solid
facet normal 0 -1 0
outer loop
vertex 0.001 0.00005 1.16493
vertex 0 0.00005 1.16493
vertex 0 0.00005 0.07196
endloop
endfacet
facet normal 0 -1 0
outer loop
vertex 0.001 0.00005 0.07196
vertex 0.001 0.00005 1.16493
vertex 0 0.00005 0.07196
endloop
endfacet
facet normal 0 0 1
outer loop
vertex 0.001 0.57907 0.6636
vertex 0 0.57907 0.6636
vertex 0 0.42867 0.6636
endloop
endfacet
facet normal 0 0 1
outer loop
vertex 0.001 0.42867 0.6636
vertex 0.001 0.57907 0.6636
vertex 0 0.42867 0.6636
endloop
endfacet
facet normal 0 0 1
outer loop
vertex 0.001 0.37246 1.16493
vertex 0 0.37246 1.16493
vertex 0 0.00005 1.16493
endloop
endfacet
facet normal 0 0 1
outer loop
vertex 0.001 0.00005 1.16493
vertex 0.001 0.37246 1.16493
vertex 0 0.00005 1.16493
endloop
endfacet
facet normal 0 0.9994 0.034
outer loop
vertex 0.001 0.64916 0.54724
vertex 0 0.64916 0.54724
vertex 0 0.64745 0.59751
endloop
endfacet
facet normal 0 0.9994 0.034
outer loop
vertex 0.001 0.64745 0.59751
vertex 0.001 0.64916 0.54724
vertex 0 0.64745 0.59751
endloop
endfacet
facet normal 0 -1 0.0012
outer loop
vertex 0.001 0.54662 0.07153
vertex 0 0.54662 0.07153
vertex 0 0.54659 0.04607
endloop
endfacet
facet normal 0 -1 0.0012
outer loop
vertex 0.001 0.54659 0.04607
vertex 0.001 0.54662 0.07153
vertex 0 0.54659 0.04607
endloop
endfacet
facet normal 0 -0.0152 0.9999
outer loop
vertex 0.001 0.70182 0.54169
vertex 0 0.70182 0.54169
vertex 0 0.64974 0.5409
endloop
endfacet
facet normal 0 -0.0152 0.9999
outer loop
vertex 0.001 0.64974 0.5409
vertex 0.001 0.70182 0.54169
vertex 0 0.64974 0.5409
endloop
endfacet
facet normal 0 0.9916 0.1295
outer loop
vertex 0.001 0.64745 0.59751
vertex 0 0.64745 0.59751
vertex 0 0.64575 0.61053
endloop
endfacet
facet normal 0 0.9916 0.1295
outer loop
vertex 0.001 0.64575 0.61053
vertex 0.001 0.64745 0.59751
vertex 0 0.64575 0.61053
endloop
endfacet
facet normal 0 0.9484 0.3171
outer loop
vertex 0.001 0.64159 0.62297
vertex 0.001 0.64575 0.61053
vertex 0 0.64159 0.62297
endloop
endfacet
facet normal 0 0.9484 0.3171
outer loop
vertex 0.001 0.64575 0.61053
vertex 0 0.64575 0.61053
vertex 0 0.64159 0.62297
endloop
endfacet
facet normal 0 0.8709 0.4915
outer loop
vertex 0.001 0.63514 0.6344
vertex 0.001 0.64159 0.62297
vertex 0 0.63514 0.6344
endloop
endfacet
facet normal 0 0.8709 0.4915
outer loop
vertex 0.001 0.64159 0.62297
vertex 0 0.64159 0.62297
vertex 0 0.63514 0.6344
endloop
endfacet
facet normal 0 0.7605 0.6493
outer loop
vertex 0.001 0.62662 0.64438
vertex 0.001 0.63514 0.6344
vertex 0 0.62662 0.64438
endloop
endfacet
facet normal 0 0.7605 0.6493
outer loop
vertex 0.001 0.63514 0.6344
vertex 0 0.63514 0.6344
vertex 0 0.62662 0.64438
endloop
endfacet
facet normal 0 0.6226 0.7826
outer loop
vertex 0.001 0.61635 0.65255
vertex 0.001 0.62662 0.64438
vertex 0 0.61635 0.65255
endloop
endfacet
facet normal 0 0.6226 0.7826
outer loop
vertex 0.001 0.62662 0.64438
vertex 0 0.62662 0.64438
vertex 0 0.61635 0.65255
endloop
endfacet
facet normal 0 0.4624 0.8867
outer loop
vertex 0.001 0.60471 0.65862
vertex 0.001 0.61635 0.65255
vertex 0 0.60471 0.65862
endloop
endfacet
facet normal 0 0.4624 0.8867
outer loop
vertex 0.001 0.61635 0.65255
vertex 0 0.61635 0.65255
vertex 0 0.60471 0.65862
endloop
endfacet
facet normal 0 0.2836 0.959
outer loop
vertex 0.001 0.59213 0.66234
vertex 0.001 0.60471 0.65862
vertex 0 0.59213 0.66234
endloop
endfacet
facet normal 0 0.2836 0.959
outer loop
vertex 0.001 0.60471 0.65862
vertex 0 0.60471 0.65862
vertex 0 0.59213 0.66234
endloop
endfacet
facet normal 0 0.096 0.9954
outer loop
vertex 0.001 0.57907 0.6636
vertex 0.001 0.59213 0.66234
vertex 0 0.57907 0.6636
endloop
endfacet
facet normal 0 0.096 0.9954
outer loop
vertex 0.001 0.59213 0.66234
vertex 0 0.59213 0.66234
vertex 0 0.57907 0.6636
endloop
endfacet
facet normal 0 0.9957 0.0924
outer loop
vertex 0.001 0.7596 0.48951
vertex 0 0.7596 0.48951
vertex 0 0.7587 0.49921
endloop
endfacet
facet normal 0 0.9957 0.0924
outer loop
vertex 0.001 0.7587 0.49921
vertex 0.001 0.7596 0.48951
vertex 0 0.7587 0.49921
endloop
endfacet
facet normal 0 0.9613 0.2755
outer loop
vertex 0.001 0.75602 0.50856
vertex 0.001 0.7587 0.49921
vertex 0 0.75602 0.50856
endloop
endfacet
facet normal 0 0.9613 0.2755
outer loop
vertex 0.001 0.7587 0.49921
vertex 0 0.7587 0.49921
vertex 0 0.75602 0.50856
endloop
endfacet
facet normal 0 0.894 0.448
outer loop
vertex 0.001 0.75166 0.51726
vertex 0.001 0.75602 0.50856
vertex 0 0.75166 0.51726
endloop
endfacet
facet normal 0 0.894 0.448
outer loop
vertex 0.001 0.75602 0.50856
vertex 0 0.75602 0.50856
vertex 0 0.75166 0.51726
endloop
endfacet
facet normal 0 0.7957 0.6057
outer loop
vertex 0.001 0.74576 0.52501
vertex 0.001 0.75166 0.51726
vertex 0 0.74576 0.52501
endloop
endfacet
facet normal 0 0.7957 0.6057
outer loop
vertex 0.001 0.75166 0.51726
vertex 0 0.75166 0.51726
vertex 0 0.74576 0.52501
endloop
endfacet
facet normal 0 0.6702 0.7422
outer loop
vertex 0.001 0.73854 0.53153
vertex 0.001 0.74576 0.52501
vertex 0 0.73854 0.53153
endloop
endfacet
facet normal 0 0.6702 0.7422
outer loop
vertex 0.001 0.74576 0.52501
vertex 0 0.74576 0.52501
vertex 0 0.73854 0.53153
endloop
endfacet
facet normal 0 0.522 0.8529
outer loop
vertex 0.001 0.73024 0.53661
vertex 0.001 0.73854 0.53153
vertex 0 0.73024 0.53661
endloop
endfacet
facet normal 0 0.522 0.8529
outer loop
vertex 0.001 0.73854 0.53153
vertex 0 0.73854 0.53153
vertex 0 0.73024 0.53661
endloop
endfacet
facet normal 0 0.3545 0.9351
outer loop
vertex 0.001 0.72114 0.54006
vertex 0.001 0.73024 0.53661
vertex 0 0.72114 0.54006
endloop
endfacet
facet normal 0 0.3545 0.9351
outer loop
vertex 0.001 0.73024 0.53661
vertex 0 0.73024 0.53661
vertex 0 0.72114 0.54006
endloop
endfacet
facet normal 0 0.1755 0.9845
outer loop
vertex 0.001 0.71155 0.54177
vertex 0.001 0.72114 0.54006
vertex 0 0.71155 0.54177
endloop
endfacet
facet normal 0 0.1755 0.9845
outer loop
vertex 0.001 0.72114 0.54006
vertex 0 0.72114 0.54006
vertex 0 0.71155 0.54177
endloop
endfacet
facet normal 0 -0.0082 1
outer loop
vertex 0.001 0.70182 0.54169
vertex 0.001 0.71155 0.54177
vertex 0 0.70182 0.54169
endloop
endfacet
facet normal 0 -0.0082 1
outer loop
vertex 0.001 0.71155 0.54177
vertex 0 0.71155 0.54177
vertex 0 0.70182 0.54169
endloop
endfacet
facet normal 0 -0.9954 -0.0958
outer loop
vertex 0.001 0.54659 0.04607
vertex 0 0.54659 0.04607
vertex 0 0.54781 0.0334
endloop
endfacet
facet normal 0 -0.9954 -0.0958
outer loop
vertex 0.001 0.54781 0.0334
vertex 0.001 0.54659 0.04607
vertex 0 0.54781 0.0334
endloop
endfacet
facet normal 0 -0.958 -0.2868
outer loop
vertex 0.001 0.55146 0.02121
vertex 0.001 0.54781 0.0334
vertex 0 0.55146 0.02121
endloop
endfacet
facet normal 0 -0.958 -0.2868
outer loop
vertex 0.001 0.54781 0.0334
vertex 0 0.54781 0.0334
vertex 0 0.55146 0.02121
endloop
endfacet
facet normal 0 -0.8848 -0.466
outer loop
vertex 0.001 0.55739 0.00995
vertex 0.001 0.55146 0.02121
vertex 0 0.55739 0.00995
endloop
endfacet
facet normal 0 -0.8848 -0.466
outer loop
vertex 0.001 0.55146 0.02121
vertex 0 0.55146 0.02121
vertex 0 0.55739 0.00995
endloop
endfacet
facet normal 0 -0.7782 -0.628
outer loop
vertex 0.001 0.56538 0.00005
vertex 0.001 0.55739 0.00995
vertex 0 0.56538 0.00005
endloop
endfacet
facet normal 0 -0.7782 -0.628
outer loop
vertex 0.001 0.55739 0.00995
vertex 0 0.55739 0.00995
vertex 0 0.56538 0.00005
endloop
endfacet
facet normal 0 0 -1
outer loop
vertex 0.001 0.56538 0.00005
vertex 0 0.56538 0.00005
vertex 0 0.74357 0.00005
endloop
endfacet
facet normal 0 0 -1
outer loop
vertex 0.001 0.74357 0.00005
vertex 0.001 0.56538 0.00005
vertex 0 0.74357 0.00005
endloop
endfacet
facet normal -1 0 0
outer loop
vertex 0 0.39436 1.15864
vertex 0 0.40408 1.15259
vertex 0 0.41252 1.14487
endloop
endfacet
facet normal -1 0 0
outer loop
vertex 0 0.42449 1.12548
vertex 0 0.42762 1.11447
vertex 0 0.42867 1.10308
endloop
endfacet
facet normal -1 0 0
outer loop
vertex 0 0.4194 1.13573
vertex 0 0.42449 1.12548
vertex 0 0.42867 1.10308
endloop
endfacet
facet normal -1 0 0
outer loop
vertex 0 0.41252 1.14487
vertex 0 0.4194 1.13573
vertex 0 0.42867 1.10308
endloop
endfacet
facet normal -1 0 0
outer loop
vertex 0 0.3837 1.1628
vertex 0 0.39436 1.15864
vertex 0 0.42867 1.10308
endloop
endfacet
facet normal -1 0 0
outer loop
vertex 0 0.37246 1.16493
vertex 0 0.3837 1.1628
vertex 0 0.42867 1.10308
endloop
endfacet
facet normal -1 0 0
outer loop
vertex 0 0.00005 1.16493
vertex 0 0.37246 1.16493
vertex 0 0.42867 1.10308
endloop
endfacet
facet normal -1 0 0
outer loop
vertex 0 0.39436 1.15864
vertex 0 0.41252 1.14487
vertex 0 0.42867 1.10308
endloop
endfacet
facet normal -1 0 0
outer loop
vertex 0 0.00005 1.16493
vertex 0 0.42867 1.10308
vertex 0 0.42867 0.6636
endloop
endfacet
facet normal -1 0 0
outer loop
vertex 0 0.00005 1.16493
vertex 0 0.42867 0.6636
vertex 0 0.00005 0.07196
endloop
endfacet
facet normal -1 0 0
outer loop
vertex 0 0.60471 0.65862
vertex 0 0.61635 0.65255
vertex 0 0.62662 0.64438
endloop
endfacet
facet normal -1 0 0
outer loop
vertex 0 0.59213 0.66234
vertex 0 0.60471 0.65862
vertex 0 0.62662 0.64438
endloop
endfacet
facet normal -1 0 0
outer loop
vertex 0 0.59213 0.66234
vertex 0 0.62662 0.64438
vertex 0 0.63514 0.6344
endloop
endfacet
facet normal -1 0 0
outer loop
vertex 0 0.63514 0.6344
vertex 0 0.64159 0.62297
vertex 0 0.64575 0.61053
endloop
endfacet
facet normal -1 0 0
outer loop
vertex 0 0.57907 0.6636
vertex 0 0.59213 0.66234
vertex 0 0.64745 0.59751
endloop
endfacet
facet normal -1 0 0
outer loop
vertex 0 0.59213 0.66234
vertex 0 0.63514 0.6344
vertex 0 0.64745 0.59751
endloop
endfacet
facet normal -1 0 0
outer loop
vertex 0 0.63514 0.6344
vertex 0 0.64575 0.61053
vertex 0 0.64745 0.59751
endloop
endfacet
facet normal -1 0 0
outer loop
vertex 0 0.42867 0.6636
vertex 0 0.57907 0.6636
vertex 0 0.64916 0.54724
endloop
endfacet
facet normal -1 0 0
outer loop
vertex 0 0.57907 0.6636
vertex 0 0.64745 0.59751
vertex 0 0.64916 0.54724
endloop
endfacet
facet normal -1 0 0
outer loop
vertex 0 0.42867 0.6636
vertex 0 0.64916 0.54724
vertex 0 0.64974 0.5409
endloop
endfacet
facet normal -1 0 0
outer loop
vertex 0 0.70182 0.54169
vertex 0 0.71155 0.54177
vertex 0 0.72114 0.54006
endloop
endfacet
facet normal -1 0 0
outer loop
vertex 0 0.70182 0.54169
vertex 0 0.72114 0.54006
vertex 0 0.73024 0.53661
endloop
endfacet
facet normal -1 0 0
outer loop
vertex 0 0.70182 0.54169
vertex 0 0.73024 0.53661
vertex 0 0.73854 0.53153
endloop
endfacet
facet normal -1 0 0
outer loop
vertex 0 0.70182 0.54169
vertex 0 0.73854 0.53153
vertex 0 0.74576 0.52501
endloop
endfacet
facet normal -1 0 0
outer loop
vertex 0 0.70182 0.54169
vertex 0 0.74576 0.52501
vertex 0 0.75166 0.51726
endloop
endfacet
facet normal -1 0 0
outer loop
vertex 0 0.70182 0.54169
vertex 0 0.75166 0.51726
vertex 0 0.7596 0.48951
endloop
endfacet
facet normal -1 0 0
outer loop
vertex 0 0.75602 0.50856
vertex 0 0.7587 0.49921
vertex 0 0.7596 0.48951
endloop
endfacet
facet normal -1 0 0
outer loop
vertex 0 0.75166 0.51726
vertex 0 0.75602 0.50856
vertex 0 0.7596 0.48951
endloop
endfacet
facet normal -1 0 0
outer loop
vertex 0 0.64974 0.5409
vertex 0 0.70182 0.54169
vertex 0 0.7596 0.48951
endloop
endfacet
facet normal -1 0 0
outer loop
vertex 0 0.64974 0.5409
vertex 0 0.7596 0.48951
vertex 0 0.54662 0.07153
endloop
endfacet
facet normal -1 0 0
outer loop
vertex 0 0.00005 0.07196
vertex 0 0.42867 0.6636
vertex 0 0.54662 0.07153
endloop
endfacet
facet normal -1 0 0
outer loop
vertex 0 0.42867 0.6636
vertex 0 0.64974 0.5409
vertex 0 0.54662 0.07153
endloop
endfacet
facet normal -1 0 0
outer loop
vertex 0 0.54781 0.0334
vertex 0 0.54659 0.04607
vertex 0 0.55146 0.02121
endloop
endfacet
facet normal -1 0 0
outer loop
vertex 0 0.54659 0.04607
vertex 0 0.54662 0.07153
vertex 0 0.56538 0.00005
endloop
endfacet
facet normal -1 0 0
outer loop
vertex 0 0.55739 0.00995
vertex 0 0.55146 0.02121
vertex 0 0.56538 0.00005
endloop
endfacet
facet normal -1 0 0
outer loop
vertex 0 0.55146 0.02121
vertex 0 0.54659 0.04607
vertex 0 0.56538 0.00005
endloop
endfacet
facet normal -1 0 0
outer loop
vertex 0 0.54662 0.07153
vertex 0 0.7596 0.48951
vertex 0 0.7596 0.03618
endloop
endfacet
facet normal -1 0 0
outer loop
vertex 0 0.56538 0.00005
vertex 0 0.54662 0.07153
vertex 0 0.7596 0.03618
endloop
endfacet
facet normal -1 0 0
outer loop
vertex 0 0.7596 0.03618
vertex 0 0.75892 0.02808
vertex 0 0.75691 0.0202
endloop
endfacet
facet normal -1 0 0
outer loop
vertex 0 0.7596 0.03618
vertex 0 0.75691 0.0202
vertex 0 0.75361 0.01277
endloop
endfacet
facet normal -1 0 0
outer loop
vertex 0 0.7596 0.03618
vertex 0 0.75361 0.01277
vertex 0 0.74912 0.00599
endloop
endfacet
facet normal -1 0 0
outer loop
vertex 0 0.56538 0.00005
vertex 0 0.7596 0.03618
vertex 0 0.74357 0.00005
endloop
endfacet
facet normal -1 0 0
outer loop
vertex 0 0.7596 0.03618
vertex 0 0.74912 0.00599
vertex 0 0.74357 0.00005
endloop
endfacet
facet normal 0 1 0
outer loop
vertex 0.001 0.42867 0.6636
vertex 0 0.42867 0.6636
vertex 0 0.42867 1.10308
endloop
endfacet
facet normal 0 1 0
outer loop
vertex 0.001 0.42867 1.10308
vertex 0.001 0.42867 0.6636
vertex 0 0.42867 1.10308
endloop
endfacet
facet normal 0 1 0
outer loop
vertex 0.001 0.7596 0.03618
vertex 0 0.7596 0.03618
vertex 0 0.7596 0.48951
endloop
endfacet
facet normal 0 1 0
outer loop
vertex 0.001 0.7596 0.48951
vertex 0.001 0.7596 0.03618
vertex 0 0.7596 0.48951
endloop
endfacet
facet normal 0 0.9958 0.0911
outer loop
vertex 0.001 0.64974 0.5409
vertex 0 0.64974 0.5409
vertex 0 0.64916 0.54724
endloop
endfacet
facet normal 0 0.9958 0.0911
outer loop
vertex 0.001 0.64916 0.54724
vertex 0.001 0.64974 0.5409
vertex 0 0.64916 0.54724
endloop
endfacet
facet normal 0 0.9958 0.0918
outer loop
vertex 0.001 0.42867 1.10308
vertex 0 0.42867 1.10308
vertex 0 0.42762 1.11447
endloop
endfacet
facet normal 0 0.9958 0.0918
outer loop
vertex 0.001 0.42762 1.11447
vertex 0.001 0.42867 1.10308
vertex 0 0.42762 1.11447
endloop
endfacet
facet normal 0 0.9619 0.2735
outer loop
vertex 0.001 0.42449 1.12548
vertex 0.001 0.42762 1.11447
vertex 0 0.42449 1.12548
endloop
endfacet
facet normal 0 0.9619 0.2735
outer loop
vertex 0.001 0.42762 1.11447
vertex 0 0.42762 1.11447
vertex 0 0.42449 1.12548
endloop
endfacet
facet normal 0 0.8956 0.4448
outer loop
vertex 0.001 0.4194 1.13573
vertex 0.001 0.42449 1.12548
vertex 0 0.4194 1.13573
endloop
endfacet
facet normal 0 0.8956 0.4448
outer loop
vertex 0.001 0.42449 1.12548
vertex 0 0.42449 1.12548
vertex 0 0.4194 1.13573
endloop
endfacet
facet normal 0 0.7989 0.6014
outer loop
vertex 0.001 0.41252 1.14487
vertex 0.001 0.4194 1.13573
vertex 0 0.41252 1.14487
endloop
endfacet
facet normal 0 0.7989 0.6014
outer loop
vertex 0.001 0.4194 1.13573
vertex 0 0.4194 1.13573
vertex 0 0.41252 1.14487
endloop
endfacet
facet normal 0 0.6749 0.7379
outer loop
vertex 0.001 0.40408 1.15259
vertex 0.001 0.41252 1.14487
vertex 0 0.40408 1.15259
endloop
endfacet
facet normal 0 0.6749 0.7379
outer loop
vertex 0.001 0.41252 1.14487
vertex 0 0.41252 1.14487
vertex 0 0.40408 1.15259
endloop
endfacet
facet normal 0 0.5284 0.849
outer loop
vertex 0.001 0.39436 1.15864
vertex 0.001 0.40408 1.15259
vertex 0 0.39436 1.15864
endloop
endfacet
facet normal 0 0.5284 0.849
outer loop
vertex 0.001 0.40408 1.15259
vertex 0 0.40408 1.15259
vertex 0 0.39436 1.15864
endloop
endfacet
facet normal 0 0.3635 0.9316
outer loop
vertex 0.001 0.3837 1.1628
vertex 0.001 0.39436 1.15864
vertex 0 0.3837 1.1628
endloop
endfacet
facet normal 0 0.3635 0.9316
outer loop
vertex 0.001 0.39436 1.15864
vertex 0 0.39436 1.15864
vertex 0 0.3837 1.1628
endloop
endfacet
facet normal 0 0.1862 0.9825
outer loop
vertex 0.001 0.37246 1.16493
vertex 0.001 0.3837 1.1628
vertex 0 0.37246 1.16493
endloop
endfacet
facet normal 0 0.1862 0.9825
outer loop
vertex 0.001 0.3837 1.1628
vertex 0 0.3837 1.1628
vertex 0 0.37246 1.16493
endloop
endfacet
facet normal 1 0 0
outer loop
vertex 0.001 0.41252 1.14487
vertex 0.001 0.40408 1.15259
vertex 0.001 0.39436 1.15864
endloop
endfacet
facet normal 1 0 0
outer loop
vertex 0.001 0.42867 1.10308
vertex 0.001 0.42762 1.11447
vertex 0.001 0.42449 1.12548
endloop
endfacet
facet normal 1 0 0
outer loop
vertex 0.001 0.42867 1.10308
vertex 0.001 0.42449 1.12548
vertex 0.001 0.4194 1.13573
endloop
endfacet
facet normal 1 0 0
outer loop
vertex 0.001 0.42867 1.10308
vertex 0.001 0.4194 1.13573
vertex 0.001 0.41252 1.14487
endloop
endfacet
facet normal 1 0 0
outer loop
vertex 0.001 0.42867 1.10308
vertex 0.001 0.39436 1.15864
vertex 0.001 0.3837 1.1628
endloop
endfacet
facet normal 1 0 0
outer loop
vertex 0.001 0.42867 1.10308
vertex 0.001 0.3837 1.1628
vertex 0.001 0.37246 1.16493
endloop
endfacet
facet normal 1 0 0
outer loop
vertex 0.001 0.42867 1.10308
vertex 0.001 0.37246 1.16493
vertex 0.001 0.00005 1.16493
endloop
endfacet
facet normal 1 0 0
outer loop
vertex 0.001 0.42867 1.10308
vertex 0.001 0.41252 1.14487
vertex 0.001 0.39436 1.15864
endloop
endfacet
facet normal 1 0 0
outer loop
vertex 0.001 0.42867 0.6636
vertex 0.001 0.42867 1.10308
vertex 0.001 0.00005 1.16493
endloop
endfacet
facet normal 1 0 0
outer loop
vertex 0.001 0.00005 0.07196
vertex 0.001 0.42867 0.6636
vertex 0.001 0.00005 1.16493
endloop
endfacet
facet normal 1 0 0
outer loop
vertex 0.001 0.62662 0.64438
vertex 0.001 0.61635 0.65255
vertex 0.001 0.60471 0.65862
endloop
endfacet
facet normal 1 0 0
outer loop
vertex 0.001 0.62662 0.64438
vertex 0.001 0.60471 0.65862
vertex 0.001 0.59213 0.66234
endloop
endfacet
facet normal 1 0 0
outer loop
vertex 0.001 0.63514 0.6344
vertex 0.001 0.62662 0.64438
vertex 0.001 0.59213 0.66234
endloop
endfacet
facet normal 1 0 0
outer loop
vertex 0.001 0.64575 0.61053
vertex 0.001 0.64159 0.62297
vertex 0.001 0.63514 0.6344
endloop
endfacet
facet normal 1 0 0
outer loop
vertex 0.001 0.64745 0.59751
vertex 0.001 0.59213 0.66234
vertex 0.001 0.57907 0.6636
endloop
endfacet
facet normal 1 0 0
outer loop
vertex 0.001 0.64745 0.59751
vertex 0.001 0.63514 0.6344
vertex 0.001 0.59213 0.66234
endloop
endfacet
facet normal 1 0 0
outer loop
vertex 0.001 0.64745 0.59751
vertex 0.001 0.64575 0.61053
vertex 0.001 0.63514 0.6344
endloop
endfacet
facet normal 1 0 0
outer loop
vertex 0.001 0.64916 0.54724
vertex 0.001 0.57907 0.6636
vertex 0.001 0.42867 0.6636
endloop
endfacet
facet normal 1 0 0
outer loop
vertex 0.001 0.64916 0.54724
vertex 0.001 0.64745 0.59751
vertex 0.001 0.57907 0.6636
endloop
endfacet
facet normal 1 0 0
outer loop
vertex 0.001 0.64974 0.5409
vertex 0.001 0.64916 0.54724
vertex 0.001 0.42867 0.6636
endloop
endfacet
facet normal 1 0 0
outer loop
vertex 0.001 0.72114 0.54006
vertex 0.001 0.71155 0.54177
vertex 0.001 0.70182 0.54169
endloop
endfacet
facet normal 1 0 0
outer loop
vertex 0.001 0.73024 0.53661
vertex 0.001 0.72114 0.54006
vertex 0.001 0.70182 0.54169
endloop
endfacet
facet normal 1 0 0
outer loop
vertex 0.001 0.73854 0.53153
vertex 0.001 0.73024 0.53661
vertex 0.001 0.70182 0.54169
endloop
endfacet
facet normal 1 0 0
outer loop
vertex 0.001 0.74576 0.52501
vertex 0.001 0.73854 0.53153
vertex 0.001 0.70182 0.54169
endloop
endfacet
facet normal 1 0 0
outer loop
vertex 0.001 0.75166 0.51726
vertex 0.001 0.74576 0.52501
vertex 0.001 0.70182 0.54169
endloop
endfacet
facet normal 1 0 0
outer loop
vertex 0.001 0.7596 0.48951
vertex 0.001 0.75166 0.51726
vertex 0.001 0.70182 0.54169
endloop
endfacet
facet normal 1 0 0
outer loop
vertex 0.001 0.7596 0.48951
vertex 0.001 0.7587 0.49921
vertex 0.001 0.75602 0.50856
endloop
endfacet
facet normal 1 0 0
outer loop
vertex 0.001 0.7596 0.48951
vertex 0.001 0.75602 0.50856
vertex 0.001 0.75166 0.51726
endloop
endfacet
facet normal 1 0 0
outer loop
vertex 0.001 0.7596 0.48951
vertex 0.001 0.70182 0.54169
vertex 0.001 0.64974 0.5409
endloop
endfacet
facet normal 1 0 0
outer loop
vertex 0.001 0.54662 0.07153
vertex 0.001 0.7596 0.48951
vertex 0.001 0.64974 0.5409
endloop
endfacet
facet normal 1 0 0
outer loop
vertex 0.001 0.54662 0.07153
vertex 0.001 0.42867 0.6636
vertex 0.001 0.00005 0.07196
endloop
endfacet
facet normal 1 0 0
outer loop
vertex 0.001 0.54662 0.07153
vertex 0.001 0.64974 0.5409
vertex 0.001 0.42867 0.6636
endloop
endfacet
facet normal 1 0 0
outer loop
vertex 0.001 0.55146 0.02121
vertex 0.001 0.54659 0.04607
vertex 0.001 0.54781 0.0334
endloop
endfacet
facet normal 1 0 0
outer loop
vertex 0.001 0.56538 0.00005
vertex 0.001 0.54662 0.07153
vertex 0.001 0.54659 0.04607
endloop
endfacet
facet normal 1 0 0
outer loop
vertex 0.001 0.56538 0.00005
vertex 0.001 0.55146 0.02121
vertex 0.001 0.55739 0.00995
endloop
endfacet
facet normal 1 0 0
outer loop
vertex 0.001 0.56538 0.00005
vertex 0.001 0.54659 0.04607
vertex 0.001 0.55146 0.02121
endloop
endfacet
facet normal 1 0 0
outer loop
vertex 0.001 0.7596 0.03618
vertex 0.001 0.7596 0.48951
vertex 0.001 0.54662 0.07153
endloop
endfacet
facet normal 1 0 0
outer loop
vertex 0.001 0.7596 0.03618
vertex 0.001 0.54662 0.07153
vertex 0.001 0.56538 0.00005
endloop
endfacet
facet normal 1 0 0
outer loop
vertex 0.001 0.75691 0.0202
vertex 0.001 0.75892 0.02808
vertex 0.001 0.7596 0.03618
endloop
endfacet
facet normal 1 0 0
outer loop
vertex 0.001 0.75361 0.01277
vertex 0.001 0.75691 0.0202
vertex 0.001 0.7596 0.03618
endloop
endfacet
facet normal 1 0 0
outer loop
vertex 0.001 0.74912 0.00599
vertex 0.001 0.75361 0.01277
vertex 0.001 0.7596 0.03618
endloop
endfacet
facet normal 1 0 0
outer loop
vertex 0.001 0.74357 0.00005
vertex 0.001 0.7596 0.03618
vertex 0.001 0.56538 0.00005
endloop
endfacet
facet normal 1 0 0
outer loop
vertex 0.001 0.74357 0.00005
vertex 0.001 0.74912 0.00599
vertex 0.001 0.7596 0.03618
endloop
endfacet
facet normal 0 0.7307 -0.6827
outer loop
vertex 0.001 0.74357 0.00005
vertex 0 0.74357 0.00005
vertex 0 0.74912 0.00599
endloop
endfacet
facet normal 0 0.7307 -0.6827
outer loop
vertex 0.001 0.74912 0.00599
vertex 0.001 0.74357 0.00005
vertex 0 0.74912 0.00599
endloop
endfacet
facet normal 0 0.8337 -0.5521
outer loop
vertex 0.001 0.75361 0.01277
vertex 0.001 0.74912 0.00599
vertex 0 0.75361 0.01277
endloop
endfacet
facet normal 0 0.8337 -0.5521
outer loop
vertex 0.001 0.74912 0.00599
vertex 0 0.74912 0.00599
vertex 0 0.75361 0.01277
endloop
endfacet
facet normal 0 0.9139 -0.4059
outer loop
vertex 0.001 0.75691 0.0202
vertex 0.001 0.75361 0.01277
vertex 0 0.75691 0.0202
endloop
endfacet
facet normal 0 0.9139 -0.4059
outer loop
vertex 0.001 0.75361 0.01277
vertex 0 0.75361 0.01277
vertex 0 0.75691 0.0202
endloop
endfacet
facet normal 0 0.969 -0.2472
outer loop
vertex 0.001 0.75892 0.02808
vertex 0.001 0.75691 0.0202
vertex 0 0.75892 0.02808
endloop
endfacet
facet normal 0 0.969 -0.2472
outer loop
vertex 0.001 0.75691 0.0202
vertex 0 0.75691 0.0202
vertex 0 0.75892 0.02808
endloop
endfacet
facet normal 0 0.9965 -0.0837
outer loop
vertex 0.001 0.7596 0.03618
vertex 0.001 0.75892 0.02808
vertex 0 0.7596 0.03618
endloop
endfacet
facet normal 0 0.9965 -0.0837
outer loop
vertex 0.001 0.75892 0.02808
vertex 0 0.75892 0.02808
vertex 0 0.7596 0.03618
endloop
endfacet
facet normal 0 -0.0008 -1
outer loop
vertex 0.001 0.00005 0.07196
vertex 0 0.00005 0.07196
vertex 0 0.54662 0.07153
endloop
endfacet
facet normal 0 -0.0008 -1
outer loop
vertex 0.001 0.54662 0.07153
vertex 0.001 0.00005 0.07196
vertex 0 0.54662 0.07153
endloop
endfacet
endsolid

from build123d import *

# Parameters (mm, degrees)
ESTRUSIONE_ESTRUSIONE1_DEPTH = 0.001


with BuildPart() as part:
    # Schizzo1 → Estrusione-Estrusione1 (new body)
    with BuildSketch(Plane(origin=(0, 0, 0), x_dir=(0, 0, -1), z_dir=(1, 0, 0))):
        with BuildLine():
            Line((-0.071526265, 0.546624161), (-0.046068814, 0.546594381))
            ThreePointArc((-0.046068814, 0.546594381), (-0.02121057, 0.551458036), (-5.0908e-05, 0.565381258))
            Line((-5.0908e-05, 0.565381258), (-5.0908e-05, 0.743573522))
            ThreePointArc((-5.0908e-05, 0.743573522), (-0.016419009, 0.755414314), (-0.036182377, 0.759600997))
            Line((-0.036182377, 0.759600997), (-0.4895145, 0.759600997))
            ThreePointArc((-0.4895145, 0.759600997), (-0.528438366, 0.742303596), (-0.5416857, 0.701821804))
            Line((-0.5416857, 0.701821804), (-0.540899911, 0.649738789))
            Line((-0.540899911, 0.649738789), (-0.547244489, 0.649164557))
            Line((-0.547244489, 0.649164557), (-0.597514987, 0.647450149))
            ThreePointArc((-0.597514987, 0.647450149), (-0.644380755, 0.626618528), (-0.663602906, 0.579069968))
            Line((-0.663602906, 0.579069968), (-0.663602906, 0.428673119))
            Line((-0.663602906, 0.428673119), (-1.103080434, 0.428673119))
            ThreePointArc((-1.103080434, 0.428673119), (-1.144869962, 0.412520862), (-1.164932966, 0.372461706))
            Line((-1.164932966, 0.372461706), (-1.164932966, 4.5196e-05))
            Line((-1.164932966, 4.5196e-05), (-0.071963325, 4.5196e-05))
            Line((-0.071963325, 4.5196e-05), (-0.071526265, 0.546624161))
        make_face()
    extrude(amount=ESTRUSIONE_ESTRUSIONE1_DEPTH)


solid = part.part
